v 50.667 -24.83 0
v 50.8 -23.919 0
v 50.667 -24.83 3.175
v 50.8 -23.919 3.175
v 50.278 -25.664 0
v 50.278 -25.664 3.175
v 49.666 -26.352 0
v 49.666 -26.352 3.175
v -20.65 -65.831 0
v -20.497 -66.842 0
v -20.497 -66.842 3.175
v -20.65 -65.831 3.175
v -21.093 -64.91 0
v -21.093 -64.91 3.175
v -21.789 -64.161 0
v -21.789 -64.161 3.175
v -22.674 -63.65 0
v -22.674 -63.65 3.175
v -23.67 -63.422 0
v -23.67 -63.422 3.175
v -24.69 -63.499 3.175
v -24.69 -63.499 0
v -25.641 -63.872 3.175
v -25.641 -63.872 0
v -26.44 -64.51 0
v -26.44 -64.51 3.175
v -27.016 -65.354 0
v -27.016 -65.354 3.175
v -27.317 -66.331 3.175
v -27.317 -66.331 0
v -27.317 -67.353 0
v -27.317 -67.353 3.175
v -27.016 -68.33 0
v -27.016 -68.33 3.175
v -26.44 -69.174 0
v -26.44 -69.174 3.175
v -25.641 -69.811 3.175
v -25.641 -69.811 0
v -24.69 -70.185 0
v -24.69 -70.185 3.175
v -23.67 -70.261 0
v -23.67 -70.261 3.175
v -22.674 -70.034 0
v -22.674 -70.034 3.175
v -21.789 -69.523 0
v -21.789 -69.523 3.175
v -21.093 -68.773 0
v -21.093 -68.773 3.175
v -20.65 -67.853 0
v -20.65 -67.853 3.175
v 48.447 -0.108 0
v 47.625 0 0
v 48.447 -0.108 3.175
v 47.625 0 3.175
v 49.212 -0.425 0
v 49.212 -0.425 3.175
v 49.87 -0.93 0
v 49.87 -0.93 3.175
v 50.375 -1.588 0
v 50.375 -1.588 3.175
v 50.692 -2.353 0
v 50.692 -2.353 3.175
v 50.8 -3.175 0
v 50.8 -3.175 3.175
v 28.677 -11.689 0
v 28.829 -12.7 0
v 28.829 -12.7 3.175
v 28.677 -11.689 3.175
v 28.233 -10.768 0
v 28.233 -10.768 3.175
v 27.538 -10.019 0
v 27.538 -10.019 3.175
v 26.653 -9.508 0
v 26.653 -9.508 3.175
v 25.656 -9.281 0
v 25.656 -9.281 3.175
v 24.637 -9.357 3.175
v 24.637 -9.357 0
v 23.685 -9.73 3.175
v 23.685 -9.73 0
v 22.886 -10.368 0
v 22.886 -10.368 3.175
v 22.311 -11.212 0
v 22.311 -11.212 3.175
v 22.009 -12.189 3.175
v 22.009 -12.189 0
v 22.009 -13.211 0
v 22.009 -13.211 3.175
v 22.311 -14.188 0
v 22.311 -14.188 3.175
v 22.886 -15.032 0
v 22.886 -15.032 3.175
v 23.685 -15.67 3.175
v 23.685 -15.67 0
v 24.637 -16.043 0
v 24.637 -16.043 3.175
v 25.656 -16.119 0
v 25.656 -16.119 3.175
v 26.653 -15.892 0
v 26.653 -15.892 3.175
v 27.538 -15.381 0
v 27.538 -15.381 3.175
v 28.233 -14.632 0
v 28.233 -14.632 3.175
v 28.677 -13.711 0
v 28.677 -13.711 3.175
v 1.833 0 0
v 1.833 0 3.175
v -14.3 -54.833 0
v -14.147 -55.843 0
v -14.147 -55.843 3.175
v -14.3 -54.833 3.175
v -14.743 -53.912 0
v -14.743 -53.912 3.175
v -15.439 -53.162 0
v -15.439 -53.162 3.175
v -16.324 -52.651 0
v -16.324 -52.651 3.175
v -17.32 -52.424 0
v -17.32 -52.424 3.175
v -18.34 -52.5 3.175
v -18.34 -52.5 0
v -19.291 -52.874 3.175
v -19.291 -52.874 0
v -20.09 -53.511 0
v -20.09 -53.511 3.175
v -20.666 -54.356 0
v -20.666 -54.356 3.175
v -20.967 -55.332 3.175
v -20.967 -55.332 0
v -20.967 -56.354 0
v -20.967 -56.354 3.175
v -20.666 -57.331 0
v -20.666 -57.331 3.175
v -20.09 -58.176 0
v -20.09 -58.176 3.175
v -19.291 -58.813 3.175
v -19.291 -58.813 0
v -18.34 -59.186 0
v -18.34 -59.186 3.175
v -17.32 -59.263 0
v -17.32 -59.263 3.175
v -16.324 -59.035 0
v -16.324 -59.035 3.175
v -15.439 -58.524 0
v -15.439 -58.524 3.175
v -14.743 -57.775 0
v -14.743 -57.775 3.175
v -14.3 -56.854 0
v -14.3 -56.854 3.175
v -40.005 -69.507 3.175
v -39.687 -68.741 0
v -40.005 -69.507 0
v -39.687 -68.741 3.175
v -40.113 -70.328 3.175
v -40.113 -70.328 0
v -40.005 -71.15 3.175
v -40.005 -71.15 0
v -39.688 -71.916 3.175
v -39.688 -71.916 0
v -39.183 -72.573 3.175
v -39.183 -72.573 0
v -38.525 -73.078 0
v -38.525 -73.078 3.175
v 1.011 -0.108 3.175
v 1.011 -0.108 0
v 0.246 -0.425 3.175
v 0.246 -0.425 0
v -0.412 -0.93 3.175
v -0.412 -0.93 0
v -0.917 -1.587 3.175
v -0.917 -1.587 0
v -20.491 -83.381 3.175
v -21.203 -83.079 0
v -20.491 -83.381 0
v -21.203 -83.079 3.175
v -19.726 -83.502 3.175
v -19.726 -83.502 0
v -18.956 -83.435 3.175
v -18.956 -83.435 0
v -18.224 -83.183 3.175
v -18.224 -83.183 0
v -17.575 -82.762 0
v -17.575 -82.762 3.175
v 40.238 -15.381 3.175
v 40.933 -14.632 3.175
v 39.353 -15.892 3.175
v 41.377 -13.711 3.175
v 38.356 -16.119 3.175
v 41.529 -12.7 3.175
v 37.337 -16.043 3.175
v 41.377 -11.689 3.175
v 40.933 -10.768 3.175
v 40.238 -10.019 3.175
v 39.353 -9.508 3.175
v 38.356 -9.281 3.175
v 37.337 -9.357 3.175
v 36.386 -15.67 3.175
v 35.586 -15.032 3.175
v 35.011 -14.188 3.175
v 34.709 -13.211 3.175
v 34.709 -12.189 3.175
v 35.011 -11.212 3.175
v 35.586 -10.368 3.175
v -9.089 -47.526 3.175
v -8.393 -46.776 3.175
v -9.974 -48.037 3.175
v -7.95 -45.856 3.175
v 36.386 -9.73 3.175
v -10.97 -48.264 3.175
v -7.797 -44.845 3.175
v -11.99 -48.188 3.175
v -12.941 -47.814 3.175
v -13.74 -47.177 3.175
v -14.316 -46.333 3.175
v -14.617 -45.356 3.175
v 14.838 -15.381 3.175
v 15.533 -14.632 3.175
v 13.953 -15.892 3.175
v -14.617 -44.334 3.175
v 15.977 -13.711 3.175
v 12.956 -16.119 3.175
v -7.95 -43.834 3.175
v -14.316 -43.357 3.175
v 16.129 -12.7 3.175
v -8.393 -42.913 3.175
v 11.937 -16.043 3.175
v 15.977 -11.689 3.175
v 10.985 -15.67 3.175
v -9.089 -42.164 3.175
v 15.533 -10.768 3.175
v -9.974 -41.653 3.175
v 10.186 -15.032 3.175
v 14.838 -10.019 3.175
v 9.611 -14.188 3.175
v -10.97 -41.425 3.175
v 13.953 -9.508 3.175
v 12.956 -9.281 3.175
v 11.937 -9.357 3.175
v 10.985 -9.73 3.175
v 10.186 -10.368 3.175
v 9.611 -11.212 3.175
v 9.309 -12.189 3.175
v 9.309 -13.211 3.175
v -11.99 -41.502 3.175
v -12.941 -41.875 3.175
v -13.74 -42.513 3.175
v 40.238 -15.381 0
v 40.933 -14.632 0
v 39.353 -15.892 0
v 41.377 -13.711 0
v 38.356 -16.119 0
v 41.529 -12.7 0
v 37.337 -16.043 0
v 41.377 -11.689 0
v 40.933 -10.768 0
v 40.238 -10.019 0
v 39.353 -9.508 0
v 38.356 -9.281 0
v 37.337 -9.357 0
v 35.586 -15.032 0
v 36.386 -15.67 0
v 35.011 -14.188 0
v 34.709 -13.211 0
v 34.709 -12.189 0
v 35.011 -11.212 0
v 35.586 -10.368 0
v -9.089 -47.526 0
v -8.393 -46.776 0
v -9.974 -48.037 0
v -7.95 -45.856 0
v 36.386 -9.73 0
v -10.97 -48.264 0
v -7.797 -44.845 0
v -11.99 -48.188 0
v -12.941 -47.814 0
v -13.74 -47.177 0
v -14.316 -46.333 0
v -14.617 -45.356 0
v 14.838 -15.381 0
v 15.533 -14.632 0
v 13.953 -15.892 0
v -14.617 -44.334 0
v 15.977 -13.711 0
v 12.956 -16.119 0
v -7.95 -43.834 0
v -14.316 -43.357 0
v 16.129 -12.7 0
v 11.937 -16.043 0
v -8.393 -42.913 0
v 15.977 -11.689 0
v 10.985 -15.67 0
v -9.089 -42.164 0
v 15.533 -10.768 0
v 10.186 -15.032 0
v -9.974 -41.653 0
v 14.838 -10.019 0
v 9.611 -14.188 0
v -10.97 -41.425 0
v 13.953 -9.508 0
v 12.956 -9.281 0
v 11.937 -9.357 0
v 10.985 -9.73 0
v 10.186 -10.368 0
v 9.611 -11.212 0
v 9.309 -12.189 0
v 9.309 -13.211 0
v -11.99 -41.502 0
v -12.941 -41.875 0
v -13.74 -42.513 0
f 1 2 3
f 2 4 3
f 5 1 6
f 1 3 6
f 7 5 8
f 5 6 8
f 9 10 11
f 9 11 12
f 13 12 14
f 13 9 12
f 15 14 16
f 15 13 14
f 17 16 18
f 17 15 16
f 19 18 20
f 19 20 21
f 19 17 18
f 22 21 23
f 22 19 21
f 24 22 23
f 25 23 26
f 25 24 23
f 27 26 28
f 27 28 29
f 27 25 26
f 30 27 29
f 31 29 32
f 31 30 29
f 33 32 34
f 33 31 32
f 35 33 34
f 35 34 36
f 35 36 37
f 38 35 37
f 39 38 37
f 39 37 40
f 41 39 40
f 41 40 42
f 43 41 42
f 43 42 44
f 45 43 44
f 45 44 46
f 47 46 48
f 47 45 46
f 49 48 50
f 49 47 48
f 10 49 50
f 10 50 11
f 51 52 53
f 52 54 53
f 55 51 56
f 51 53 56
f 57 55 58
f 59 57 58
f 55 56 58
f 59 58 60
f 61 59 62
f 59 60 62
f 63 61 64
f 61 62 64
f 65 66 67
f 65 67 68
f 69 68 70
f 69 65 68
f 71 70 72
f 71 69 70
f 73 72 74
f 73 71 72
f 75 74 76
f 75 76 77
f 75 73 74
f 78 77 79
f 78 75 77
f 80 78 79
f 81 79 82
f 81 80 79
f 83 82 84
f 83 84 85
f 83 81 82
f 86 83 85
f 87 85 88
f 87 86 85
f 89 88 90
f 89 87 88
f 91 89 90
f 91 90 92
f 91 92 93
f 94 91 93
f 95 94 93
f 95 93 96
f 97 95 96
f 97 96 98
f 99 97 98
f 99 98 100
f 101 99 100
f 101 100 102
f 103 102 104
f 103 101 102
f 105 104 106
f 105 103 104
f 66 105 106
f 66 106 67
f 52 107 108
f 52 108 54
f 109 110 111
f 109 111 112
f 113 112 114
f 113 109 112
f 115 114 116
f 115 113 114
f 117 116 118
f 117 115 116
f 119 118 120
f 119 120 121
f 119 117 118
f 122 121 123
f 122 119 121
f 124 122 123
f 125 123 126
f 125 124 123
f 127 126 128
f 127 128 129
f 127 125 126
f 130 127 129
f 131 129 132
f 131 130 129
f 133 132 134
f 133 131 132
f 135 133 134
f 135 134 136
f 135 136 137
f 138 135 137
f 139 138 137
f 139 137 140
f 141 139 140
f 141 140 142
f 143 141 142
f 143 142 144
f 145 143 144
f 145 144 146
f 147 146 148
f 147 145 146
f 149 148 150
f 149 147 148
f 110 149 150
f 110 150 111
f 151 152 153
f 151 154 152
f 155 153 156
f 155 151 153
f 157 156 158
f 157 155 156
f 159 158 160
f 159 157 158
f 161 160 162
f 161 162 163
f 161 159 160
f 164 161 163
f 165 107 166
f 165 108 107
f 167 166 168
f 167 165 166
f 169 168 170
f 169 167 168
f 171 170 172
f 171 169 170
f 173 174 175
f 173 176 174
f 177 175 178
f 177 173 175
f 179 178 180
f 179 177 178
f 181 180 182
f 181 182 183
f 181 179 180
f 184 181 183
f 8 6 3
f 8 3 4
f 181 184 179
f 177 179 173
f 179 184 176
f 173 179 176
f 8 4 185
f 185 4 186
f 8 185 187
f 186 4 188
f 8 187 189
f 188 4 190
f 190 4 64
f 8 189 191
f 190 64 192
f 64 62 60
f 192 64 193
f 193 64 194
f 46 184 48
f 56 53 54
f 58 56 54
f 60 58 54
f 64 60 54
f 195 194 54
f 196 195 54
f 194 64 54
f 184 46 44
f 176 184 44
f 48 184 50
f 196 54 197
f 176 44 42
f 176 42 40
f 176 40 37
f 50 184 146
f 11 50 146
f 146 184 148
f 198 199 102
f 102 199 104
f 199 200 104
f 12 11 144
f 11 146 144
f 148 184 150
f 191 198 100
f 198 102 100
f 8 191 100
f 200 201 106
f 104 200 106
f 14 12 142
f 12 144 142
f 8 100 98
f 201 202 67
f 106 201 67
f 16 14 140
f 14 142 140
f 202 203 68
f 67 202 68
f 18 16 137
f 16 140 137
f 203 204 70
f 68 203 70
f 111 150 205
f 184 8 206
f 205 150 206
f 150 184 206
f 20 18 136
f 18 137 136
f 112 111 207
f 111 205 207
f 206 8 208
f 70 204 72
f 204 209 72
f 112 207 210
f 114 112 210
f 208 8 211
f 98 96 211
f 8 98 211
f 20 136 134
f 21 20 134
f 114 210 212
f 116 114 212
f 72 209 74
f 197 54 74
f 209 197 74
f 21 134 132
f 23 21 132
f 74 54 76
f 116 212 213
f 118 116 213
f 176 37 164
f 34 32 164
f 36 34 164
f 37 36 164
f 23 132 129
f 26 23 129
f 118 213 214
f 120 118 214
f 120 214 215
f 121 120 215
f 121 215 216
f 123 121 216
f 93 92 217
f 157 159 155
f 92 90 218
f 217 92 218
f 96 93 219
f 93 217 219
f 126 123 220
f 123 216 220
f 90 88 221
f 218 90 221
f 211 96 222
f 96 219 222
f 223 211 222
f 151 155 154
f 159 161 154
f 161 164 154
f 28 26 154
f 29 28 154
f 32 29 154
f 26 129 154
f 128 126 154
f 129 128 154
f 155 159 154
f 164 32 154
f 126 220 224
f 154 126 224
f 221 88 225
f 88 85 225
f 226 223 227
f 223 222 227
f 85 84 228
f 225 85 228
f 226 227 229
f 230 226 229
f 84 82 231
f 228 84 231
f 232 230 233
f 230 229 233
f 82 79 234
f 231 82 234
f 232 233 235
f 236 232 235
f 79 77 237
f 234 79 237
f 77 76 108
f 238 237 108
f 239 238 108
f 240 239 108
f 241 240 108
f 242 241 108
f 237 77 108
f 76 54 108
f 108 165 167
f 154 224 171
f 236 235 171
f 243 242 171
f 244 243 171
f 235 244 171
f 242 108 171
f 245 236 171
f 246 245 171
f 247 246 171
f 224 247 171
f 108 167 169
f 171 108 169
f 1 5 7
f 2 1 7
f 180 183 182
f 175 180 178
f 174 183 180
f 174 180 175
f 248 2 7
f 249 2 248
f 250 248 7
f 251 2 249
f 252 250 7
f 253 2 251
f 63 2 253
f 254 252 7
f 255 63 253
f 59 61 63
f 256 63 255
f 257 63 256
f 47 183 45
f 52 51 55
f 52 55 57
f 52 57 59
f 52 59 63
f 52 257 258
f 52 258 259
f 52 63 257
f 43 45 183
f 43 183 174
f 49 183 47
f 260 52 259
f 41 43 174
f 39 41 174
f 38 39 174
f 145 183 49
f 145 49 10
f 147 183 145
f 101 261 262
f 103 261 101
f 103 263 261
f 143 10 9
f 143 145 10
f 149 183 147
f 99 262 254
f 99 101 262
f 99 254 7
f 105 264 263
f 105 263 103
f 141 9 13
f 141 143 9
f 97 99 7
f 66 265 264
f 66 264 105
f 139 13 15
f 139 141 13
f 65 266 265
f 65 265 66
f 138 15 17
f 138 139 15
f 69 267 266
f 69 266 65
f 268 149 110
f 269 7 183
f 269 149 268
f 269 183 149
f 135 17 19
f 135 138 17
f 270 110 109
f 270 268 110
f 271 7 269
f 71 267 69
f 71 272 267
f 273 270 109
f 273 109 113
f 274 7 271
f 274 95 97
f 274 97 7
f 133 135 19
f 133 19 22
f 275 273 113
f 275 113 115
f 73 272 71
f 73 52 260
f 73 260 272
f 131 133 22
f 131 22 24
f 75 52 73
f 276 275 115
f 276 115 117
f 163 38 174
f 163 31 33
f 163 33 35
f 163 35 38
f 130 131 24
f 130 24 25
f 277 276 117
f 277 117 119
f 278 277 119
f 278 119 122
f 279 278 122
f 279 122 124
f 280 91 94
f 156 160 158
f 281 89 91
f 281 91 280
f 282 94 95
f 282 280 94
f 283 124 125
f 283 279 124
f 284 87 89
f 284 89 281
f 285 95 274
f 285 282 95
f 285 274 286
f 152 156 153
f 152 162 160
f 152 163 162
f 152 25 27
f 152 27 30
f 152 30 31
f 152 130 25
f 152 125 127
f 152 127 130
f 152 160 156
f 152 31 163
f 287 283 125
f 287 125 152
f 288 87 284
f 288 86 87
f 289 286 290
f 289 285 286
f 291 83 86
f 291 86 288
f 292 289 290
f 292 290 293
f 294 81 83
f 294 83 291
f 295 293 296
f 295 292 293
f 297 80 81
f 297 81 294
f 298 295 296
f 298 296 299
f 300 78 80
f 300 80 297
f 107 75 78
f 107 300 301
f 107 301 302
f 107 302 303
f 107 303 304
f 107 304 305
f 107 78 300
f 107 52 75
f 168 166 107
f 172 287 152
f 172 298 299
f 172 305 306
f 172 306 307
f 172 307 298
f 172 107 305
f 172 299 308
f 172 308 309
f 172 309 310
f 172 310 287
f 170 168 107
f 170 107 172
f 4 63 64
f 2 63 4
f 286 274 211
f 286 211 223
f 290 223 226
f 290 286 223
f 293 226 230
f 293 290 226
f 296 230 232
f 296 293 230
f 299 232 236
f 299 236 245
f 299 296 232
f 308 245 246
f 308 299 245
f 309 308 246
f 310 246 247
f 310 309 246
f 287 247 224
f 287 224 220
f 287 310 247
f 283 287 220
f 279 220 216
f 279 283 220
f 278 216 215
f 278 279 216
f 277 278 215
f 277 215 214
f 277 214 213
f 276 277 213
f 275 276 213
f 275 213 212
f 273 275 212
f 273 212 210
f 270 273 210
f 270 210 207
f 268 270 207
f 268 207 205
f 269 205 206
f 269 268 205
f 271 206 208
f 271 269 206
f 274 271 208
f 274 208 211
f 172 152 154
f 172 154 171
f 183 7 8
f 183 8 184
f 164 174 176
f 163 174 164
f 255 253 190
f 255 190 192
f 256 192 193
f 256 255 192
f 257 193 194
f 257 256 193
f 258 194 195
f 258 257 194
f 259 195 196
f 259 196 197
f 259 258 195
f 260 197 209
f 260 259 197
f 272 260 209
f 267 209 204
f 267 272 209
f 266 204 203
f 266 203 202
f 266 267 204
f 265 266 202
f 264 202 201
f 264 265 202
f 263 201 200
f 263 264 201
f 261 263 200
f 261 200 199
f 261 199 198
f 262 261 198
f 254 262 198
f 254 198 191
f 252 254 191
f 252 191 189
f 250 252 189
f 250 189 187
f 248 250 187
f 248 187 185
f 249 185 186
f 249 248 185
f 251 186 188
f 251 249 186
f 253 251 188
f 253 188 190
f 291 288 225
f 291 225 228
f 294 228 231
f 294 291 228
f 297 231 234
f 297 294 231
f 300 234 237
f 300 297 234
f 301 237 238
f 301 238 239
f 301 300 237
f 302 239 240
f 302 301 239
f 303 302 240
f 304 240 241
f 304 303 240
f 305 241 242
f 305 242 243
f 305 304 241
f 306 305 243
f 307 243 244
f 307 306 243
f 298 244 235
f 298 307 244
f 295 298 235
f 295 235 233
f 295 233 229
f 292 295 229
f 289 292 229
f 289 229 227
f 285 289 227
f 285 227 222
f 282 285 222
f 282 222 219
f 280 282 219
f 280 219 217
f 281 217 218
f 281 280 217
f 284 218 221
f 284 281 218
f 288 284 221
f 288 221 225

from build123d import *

# Parameters (mm, degrees)
SKETCH1_R           = 3.429
BOSS_EXTRUDE1_DEPTH = 3.175
FILLET1_R           = 3.175


with BuildPart() as part:
    # Sketch1 → Boss-Extrude1 (new body)
    with BuildSketch(Plane.XY):
        Polygon((0, 0), (50.8, 0), (50.8, -25.4), (-19.277954744, -84.190397082), (-41.275, -71.490397082), align=None)
        with Locations((38.1, -12.7)):
            Circle(SKETCH1_R, mode=Mode.SUBTRACT)
        with Locations((25.4, -12.7)):
            Circle(SKETCH1_R, mode=Mode.SUBTRACT)
        with Locations((12.7, -12.7)):
            Circle(SKETCH1_R, mode=Mode.SUBTRACT)
        with Locations((-23.926477372, -66.841874454)):
            Circle(SKETCH1_R, mode=Mode.SUBTRACT)
        with Locations((-17.576477372, -55.843351826)):
            Circle(SKETCH1_R, mode=Mode.SUBTRACT)
        with Locations((-11.226477372, -44.844829198)):
            Circle(SKETCH1_R, mode=Mode.SUBTRACT)
    extrude(amount=BOSS_EXTRUDE1_DEPTH)

    # Fillet1
    fillet1_edges = [part.edges().sort_by_distance(p)[0] for p in [
        (0, 0, 1.5875),
        (50.8, 0, 1.5875),
        (50.8, -25.4, 1.5875),
        (-19.277954744, -84.190397082, 1.5875),
        (-41.275, -71.490397082, 1.5875),
    ]]
    fillet(fillet1_edges, radius=FILLET1_R)


solid = part.part
